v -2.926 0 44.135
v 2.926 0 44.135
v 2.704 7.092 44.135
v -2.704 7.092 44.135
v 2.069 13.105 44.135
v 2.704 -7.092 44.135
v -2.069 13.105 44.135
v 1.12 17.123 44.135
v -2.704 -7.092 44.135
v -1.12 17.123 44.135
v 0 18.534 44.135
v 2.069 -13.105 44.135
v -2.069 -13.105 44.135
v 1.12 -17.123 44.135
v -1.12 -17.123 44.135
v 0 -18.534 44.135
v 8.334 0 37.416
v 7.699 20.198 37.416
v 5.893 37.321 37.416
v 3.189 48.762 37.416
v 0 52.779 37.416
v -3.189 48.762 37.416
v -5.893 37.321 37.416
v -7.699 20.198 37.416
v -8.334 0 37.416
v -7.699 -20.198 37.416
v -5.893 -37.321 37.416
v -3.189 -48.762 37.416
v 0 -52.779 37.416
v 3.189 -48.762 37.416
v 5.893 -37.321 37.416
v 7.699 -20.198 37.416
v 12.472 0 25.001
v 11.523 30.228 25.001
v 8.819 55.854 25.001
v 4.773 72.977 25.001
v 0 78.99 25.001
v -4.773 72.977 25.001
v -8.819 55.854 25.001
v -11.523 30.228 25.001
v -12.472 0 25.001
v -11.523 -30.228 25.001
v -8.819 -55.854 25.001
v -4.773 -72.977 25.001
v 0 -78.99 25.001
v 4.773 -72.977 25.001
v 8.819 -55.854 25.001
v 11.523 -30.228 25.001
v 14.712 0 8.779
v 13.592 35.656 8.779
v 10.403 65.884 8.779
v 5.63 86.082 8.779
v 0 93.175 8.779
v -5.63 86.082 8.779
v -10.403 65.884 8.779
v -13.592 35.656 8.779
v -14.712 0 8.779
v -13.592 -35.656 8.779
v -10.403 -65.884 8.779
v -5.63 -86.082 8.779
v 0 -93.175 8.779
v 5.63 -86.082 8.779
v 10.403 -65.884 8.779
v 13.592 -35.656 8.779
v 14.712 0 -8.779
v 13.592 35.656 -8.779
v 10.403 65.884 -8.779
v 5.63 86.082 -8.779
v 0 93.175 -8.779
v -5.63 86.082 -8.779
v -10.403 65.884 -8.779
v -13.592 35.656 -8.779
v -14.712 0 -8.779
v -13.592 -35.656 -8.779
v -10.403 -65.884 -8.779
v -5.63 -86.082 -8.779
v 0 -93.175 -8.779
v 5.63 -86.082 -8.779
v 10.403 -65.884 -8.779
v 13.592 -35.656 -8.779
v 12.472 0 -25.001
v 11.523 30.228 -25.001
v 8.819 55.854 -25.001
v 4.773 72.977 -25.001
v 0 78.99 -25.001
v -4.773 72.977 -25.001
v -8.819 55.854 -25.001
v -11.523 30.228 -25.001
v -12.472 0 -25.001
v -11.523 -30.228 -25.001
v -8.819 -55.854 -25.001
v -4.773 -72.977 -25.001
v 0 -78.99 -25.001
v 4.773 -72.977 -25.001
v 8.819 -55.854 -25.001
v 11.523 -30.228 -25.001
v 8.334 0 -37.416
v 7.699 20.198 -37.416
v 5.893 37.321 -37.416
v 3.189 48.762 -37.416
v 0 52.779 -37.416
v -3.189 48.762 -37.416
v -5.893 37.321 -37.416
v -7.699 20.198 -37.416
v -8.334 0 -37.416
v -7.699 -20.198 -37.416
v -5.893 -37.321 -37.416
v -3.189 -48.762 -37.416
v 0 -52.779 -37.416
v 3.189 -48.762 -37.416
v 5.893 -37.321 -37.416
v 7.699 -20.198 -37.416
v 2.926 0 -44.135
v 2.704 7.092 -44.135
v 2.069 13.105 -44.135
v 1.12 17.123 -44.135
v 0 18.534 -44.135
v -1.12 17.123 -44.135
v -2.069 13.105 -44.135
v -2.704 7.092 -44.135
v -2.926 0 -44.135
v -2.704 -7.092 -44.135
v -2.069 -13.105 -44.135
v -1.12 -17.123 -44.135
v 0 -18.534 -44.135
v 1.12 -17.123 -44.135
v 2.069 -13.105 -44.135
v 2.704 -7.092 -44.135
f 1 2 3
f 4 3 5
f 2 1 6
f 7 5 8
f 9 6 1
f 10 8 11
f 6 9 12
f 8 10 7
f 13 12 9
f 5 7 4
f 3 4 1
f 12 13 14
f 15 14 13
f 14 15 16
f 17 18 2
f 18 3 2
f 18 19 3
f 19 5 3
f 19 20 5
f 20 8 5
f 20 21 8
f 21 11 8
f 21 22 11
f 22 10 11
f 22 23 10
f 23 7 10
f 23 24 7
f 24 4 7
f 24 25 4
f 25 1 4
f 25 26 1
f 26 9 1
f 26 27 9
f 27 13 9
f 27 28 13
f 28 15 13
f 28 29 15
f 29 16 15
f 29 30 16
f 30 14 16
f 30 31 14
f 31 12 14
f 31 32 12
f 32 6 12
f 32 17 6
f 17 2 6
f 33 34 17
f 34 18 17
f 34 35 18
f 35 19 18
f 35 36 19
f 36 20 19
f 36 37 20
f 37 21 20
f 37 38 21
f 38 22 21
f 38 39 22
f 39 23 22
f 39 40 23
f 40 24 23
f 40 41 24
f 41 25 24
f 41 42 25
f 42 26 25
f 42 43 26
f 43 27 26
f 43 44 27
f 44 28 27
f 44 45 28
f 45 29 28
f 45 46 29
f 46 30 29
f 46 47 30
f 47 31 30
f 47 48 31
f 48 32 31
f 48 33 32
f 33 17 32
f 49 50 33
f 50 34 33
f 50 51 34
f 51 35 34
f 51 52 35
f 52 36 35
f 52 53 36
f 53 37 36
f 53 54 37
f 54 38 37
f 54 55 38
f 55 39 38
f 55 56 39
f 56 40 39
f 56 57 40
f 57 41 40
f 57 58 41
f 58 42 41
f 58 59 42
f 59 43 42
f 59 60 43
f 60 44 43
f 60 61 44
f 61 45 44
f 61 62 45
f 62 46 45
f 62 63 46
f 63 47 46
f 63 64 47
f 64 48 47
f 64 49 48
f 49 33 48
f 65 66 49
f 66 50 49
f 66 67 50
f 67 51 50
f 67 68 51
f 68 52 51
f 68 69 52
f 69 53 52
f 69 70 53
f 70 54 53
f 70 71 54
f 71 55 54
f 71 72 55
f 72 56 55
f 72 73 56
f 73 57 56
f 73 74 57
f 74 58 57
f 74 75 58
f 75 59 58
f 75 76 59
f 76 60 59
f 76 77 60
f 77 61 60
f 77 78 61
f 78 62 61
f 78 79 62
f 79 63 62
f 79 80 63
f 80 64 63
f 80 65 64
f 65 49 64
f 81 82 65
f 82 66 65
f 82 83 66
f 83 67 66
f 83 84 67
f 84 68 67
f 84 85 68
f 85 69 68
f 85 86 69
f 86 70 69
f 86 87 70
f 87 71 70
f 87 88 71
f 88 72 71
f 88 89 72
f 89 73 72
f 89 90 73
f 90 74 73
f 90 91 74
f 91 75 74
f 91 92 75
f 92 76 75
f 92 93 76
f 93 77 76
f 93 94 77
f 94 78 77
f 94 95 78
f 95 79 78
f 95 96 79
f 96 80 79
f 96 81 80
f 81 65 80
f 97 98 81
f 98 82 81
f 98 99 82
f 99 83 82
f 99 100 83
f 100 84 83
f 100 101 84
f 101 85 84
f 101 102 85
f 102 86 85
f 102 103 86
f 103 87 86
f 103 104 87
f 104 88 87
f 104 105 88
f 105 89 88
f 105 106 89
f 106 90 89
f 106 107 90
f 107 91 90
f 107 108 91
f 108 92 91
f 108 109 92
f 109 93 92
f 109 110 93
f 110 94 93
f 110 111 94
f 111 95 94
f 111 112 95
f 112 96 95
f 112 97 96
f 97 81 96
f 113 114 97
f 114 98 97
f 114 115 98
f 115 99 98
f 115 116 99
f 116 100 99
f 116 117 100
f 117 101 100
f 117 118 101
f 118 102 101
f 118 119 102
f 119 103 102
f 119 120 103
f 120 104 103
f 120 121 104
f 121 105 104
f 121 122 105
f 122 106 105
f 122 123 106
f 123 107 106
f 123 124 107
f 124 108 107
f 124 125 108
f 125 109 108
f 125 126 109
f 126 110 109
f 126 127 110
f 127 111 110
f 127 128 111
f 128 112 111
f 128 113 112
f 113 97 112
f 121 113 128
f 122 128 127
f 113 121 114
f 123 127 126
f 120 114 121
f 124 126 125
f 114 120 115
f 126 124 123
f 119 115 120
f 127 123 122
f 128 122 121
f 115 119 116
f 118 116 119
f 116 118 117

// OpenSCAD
// Generated by SolidPython 1.0.1 on 2020-07-29 00:46:46


scale(v = [3, 19, 9]) {
	sphere(r = 5);
}
/***********************************************
*********      SolidPython code:      **********
************************************************
 
# import packages: SolidPython
from solid import *
from solid.utils import *
from itertools import chain, combinations, permutations


class Resize:

    def __init__(self, scad_file):
        self.scad_file = scad_file
        #self.scad_file = import_scad(scad_file)
        # cone/cylinder param:
        self.r1 = 0
        self.r2 = 0
        self.h = 0
        # rectangular prism param:
        self.w = 0
        self.l = 0
        # ellipse param:
        self.r = 0

    # import OpenScad code (file name corresponds to shape)


    # classify shape + parameters
    def assign(self, param1, param2, param3):
        if self.scad_file == 'cone.scad':
            self.r1 = param1
            self.r2 = param2
            self.h = param3
        elif self.scad_file == 'cylinder.scad':
            self.r1 = param1
            self.r2 = param2
            self.h = param3
        elif self.scad_file == 'rectangularPrism.scad':
            self.h = param1
            self.l = param2
            self.w = param3
        else:
            self.r = param1
            self.h = param2

    # resize parameters
    def iterate(self):
        x = range(3, 20, 2)
        i = 1
        if self.scad_file == 'cone.scad':
            tempList = list(permutations(x, 2))
            for temp in tempList:
                param1 = temp[0]
                param2 = temp[1]
                filepath = 'produced_scad_files/' + 'cone' + str(param1) + '_' + str(param2) + '_' + '.scad'
                scad_render_to_file(cylinder(h=param1, r1=param2, r2=0), filepath)

        elif self.scad_file == 'cylinder.scad':
            tempList = list(permutations(x, 3))
            for temp in tempList:
                param1 = temp[0]
                param2 = temp[1]
                filepath = 'produced_scad_files/' + 'cylinder' + str(param1) + '_' + str(param2) + '_' + '.scad'
                scad_render_to_file(cylinder(h=param1, r1=param2, r2=param2), filepath)

        elif self.scad_file == 'rectangularPrism.scad':
            tempList = list(permutations(x, 3))
            for temp in tempList:
                param1 = temp[0]
                param2 = temp[1]
                param3 = temp[2]
                filepath = 'produced_scad_files/' + 'rectangularPrism' + str(param1) + '_' + str(param2) + '_' + str(
                    param3) + '.scad'
                scad_render_to_file(cube(size=(param1, param2, param3)), filepath)

        elif self.scad_file == 'ellipse.scad':
            tempList = list(permutations(x, 4))
            for temp in tempList:
                param1 = temp[0]
                param2 = temp[1]
                param3 = temp[2]
                param4 = temp[3]
                filepath = 'produced_scad_files/' + 'ellipse' + str(param1) + '_' + str(param2) + '_' + str(param3) + '_' + str(param4) + '.scad'
                scad_render_to_file(scale([param1, param2, param3])(sphere(r=param4)), filepath)

    def render_to_scadfile(self):
        scad_render_to_file(scad, 'example.scad') 
 
************************************************/
